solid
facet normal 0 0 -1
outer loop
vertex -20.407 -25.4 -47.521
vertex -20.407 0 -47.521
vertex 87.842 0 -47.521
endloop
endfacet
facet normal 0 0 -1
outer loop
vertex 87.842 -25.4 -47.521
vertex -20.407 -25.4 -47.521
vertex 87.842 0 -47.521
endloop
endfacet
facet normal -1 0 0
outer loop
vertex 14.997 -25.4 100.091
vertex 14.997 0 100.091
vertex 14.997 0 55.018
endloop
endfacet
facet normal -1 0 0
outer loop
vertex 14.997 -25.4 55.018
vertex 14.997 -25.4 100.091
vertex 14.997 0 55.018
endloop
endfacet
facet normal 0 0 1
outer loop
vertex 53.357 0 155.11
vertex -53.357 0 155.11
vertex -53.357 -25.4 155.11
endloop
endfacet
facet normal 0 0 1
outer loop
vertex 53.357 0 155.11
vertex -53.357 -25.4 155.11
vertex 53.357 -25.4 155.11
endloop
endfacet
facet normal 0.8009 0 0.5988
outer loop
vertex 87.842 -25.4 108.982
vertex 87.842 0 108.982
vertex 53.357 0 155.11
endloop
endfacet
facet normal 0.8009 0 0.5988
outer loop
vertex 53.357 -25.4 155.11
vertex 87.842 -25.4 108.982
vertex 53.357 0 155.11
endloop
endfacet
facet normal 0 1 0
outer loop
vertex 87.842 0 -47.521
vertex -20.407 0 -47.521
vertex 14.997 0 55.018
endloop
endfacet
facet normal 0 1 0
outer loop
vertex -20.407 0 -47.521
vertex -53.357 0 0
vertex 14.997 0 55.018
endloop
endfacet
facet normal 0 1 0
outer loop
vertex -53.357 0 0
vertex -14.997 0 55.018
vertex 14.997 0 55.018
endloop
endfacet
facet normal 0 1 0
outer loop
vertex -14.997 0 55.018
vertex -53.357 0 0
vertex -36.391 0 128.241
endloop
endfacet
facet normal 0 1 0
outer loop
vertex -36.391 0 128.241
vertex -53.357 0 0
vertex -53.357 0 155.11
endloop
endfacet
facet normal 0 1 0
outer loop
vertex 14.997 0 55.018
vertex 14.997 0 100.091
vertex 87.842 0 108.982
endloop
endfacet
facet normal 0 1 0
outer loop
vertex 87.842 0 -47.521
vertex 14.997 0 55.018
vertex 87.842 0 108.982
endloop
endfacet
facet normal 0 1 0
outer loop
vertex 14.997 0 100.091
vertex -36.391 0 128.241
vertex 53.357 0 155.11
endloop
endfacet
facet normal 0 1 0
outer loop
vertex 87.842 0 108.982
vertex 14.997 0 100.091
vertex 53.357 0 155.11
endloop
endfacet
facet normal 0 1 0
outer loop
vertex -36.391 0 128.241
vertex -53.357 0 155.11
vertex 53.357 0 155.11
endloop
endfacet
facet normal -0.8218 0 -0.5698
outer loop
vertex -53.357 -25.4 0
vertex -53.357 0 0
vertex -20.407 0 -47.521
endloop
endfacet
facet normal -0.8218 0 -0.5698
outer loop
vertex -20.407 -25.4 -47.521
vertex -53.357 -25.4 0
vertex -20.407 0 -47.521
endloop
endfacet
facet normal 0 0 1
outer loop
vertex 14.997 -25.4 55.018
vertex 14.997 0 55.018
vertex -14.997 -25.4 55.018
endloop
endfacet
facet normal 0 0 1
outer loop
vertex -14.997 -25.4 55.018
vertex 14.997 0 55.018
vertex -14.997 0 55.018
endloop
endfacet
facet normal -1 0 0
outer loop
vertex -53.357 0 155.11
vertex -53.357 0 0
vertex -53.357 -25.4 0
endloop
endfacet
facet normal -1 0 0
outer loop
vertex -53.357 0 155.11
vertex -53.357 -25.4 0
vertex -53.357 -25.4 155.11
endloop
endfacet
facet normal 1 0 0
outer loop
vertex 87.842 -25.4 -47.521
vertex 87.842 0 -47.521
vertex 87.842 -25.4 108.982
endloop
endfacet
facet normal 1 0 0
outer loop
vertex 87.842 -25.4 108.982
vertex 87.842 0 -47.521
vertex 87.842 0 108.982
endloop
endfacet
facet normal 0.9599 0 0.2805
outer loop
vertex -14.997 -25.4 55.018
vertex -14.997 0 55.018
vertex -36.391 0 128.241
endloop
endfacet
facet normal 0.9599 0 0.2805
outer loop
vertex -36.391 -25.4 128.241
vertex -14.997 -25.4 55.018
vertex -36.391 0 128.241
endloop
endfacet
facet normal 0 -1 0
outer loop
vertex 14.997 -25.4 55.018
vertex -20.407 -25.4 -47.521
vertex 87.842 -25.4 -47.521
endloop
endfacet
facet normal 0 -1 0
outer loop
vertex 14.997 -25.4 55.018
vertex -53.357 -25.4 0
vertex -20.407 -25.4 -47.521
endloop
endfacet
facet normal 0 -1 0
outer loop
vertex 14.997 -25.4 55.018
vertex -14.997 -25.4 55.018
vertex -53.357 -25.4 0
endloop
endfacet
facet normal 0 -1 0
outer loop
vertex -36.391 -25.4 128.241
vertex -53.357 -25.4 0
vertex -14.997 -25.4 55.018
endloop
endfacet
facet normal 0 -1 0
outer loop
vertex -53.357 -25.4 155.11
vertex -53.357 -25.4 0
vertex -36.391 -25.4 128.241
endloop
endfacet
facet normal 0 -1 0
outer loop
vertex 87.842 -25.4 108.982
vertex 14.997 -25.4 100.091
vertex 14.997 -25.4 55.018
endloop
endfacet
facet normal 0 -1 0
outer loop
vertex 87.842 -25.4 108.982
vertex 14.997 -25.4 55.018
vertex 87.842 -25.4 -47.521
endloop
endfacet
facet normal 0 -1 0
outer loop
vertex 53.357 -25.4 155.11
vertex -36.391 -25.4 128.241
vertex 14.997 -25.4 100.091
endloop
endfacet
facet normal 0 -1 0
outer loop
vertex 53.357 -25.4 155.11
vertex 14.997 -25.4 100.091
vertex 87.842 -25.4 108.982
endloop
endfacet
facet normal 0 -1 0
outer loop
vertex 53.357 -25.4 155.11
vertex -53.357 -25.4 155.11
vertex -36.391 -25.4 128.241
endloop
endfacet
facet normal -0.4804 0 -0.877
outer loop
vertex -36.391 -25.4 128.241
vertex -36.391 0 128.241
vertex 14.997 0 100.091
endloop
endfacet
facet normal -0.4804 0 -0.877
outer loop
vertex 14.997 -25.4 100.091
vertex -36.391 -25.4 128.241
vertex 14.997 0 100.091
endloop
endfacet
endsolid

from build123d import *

# Parameters (mm, degrees)
F0_W     = 106.714278
F0_H     = 155.109674
F1_DEPTH = 25.4


with BuildPart() as f1:
    # F0 (on Front) → F1 (new body)
    with BuildSketch(Plane.XZ):
        Polygon((87.841675, -47.520965), (53.357139, 0), (-53.357139, 0), (-20.406917, -47.520965), align=None)
        with Locations((0, 77.554837)):
            Rectangle(F0_W, F0_H)
        Polygon((14.997154, 55.01838), (-14.997154, 55.01838), (-36.390718, 128.240824), (14.997154, 100.091293), align=None, mode=Mode.SUBTRACT)
        Polygon((53.357139, 155.109674), (53.357139, 0), (87.841675, -47.520965), (87.841675, 108.981639), align=None)
    extrude(amount=F1_DEPTH)


solid = f1.part
